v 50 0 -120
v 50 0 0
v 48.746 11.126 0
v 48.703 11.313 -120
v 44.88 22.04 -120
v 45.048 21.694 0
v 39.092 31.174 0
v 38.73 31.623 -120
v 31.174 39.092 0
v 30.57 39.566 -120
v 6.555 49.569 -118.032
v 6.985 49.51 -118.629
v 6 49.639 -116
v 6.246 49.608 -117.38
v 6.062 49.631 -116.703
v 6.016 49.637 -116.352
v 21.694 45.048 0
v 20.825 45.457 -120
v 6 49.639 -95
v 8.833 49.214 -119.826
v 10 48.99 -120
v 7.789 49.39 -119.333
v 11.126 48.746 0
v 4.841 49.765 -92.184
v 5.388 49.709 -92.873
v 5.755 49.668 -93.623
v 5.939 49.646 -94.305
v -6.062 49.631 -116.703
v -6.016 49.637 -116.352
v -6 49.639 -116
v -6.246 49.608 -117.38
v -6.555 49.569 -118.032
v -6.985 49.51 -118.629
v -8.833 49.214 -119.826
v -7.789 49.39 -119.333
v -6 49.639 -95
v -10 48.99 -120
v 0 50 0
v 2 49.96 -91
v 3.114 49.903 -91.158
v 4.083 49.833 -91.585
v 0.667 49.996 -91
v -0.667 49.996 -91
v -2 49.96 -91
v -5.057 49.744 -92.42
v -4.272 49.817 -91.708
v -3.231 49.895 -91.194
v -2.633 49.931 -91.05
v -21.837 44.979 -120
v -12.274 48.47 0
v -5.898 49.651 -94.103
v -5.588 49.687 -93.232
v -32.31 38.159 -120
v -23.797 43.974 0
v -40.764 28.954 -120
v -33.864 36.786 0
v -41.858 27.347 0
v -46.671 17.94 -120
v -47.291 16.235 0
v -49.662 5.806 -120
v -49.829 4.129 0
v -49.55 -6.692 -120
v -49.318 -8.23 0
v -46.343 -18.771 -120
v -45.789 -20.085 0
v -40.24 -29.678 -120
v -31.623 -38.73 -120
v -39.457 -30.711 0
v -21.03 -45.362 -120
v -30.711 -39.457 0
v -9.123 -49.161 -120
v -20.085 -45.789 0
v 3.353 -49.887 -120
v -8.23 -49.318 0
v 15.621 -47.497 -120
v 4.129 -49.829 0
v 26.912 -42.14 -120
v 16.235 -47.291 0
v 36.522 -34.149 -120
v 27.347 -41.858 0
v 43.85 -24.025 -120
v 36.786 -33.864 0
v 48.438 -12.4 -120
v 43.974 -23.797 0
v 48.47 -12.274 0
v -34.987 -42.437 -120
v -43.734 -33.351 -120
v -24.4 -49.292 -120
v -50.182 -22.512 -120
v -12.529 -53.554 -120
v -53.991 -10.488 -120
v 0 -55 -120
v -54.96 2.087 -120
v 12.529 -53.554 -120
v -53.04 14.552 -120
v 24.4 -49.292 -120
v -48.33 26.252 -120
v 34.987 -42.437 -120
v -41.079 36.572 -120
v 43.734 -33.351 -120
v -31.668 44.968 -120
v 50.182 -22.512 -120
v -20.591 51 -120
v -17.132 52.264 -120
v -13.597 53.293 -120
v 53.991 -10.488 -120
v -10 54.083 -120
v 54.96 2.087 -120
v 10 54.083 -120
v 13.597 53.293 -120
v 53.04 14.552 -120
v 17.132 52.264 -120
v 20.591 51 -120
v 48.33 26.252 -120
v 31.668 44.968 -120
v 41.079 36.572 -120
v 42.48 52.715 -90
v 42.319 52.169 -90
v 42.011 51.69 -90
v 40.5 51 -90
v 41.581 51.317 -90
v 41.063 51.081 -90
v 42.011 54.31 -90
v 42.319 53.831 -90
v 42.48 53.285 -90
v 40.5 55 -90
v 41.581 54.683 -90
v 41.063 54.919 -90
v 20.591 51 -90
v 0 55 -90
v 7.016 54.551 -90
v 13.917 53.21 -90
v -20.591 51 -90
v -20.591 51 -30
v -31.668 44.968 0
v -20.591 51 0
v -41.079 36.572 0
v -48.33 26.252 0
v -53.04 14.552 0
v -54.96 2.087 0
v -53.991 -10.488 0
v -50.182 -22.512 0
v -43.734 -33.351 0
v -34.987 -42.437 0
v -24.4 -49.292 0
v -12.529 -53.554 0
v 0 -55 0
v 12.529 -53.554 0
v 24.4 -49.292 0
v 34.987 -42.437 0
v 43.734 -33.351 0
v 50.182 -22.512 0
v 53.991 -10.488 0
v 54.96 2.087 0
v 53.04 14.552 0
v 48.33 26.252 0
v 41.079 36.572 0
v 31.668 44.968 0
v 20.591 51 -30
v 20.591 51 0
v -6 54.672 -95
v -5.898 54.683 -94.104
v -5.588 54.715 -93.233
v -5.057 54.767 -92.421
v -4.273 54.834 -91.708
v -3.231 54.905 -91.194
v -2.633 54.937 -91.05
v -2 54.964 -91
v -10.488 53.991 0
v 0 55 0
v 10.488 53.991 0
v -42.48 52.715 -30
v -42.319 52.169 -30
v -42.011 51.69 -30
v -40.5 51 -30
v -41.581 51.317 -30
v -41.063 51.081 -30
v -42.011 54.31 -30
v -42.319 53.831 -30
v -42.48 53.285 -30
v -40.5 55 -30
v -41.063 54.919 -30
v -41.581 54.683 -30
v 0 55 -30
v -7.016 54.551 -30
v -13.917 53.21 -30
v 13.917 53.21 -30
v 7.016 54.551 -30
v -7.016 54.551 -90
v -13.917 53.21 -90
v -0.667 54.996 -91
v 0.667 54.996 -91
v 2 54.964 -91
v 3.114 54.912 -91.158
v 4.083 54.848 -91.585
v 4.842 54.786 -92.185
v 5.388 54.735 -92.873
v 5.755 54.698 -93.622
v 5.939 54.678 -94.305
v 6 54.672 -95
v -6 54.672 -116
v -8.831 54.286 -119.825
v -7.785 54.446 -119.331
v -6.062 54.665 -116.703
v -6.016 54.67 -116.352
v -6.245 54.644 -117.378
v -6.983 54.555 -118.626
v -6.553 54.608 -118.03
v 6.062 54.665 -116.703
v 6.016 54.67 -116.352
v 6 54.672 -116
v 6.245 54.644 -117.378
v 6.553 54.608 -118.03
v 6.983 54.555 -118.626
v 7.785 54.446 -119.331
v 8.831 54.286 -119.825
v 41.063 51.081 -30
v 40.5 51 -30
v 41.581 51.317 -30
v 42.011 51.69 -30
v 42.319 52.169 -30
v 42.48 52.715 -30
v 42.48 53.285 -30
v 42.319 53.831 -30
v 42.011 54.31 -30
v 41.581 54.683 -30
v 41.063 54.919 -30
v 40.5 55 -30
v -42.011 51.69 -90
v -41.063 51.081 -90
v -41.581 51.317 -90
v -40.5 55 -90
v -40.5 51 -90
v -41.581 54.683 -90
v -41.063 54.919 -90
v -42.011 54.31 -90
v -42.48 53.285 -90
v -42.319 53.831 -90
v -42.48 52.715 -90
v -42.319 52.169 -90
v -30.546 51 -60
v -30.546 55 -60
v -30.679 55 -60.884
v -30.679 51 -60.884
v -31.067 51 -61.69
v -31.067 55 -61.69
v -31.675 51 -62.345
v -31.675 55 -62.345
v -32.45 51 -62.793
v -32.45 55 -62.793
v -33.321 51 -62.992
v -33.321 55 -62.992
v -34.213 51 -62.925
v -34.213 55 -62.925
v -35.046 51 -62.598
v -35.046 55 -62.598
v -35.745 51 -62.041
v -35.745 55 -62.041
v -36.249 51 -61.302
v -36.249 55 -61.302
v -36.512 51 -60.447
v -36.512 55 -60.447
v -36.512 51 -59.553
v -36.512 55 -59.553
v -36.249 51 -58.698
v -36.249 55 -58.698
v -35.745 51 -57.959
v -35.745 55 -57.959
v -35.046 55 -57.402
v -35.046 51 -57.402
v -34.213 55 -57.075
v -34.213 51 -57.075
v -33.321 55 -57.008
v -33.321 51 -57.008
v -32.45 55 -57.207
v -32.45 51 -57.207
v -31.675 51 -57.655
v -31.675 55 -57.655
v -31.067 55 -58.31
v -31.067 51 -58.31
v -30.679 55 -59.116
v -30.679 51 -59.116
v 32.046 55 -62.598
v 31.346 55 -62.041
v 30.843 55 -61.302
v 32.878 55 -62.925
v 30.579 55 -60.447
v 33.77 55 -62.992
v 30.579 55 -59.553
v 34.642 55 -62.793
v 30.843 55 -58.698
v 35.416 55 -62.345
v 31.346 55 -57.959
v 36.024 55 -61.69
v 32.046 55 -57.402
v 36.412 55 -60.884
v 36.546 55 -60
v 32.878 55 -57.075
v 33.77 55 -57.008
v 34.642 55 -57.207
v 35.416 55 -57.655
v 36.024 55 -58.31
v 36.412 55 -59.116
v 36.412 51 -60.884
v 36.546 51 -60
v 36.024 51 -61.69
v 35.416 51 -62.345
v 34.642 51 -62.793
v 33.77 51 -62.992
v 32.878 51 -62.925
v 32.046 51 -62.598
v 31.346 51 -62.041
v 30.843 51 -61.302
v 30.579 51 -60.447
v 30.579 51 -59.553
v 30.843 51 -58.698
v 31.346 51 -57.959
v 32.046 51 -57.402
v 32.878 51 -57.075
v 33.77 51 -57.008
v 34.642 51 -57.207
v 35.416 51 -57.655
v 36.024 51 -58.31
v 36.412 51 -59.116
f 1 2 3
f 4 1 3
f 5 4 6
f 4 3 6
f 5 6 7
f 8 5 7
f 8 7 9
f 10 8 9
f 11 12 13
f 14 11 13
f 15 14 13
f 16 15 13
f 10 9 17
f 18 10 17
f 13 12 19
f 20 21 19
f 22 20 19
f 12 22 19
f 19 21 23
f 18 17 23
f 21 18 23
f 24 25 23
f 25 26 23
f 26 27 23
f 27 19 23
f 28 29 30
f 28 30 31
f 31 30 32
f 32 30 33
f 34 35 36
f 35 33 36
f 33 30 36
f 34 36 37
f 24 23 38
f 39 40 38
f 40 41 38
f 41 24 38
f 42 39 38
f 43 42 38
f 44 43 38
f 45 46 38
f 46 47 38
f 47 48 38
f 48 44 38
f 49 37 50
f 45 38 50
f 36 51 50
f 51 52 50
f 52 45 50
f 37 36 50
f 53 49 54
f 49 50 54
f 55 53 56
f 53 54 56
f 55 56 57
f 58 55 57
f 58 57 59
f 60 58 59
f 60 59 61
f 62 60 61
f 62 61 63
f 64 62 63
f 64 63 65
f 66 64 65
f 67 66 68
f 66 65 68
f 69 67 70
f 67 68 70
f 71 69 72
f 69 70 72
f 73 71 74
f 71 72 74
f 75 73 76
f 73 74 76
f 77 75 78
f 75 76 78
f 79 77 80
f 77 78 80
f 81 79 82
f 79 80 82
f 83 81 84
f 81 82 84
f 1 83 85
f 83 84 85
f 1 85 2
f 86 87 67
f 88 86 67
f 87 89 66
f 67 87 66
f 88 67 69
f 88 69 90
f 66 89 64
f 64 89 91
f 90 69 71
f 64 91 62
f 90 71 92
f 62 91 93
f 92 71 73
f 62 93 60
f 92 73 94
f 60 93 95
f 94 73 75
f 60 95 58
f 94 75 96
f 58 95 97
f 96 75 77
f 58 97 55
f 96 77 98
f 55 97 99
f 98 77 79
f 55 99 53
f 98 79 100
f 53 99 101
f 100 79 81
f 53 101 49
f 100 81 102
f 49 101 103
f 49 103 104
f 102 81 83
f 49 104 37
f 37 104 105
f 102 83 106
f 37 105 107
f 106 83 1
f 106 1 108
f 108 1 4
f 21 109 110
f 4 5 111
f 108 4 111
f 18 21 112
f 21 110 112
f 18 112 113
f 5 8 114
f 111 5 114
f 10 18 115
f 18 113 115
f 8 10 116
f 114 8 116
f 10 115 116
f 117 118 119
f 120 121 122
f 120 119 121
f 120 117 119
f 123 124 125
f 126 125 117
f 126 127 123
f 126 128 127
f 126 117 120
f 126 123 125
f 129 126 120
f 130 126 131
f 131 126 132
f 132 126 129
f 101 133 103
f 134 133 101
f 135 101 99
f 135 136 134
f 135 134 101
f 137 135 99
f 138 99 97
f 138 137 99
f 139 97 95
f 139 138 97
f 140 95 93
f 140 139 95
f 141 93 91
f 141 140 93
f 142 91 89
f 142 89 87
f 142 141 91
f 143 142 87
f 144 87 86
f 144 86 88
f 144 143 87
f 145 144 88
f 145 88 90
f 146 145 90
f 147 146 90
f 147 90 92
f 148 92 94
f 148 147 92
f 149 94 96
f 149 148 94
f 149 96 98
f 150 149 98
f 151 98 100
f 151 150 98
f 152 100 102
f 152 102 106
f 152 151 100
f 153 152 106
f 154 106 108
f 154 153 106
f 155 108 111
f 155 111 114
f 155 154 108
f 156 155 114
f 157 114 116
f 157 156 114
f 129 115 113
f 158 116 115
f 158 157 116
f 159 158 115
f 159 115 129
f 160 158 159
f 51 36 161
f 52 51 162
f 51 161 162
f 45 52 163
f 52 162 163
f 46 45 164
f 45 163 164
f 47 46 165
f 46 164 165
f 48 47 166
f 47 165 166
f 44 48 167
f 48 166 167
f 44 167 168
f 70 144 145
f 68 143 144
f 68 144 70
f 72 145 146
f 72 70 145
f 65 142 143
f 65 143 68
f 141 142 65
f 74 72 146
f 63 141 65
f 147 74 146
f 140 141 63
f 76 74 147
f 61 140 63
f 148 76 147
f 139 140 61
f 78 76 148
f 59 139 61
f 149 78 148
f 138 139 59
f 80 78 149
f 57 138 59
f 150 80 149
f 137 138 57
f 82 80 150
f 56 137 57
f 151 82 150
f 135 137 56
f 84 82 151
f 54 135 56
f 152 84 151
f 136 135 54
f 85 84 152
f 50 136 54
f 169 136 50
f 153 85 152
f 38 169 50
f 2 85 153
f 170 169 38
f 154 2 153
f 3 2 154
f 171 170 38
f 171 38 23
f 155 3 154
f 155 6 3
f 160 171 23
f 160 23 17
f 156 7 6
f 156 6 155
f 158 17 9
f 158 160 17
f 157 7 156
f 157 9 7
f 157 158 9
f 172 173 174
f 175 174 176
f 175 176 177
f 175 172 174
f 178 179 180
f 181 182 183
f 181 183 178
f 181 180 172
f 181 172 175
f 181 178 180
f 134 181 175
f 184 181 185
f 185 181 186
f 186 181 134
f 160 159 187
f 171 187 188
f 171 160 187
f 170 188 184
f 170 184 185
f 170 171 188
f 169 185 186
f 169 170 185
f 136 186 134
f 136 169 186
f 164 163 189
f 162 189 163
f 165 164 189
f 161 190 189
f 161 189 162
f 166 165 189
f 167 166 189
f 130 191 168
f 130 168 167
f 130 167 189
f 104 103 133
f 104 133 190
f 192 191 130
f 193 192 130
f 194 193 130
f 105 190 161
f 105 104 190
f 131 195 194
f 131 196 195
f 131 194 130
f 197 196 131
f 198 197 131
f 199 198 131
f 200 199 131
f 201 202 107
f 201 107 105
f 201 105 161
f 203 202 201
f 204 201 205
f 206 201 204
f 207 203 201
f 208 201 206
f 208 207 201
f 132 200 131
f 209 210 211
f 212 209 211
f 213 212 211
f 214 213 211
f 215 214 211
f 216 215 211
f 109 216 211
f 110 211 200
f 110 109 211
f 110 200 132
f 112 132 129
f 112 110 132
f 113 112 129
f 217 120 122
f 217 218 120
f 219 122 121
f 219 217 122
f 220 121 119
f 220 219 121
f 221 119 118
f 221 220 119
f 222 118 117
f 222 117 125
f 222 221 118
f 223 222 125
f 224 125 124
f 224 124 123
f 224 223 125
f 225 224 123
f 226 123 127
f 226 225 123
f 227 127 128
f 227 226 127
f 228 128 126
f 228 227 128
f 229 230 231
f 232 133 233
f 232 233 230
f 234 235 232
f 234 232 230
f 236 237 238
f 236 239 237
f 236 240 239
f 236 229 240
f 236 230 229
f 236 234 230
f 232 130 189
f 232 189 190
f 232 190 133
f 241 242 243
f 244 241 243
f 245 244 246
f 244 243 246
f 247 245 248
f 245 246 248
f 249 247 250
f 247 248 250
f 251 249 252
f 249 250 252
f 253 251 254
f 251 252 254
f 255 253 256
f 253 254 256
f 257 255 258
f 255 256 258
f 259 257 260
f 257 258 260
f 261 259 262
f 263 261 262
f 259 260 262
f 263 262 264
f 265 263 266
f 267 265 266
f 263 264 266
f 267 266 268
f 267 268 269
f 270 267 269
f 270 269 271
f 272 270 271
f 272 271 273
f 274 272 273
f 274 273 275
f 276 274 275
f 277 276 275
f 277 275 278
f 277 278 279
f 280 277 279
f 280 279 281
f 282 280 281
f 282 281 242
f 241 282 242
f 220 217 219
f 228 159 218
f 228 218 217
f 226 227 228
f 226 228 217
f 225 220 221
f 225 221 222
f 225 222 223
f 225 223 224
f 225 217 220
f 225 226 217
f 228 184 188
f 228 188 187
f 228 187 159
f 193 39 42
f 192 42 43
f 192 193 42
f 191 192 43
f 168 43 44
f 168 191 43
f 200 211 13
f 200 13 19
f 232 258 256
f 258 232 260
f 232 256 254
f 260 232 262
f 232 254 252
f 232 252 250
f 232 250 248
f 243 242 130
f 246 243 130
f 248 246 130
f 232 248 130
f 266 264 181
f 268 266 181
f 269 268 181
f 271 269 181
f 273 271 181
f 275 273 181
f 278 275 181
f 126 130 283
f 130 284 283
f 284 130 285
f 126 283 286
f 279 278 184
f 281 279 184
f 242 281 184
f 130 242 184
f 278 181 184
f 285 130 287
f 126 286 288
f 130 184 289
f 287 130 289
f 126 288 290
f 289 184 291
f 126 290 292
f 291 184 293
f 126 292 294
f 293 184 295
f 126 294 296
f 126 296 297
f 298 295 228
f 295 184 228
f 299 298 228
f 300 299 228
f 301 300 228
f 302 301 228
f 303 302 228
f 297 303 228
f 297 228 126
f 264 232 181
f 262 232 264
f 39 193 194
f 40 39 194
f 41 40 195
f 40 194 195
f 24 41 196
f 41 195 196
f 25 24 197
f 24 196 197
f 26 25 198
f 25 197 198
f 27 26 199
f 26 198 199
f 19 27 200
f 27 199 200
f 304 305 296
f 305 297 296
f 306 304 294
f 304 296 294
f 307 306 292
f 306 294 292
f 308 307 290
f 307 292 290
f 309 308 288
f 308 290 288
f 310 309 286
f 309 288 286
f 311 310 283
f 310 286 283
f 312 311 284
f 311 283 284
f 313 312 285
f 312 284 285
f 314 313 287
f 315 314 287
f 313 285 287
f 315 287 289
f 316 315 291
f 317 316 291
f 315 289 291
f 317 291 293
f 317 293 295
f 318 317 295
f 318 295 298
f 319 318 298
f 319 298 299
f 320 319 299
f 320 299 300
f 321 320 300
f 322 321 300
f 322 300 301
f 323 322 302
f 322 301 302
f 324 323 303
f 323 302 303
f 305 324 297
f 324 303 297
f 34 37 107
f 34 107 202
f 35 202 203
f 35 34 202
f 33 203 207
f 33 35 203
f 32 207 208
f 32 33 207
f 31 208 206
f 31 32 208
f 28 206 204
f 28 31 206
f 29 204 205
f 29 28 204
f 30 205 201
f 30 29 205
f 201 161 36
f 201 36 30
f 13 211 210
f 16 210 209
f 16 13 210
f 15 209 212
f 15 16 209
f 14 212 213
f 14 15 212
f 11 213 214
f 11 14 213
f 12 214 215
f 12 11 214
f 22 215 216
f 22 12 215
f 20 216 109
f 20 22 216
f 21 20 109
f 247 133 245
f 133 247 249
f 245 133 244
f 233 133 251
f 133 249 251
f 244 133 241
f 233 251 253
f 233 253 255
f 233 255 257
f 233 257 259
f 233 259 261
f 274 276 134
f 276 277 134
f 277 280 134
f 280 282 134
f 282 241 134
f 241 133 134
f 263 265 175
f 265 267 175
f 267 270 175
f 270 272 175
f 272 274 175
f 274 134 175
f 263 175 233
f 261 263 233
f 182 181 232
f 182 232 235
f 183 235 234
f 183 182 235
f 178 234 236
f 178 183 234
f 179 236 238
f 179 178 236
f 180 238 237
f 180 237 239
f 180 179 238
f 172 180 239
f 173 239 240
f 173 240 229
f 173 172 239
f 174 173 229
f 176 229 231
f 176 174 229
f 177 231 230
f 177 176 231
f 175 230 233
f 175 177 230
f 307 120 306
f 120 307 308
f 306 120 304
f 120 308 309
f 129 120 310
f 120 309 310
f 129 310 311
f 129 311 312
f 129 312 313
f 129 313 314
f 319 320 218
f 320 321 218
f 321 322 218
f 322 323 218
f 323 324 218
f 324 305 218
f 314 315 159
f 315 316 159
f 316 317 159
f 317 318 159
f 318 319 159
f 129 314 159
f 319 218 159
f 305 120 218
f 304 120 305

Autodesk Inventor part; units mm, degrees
ref_plane "YZ Plane" through (0, 0, 0) normal (1, 0, 0) x (0, 1, 0)
ref_plane "XZ Plane" through (0, 0, 0) normal (0, 1, 0) x (-1, 0, 0)
sketch "Sketch1" plane through (0, 0, 0) normal (0, 0, 1) x (1, 0, 0)
  arc A0 (-20.5913, 51) -> (20.5913, 51) centre (0, 0) ccw
  circle A1 centre (0, 0) radius 50
  line L0 (-40.5, 55) -> (40.5, 55)
  arc A2 (-40.5, 55) -> (-40.5, 51) centre (-40.5, 53) ccw
  arc A3 (40.5, 51) -> (40.5, 55) centre (40.5, 53) ccw
  line L1 (40.5, 51) -> (19.5959, 51)
  line L2 (40.5, 51) -> (19.5959, 51)
  line L3 (40.5, 51) -> (19.5959, 51)
  line L4 (19.5959, 51) -> (-40.5, 51)
  line L5 (0, 51) -> (0, 50)
  dimension "d0" = 110
  dimension "d1" = 100
extrude "Extrusion1" add sketch "Sketch1" against normal blind 120
sketch "Sketch2" plane through (0, 0, 0) normal (0, 0, 1) x (1, 0, 0)
  circle A0 centre (0, 0) radius 50 projected
  line L0 (-40.5, 51) -> (-20.5913, 51) projected
  arc A1 (-20.5913, 51) -> (20.5913, 51) centre (0, 0) ccw projected
  line L1 (20.5913, 51) -> (40.5, 51) projected
  arc A2 (40.5, 51) -> (40.5, 55) centre (40.5, 53) ccw projected
  line L2 (40.5, 55) -> (-40.5, 55) projected
  arc A3 (-40.5, 55) -> (-40.5, 51) centre (-40.5, 53) ccw projected
  circle A4 centre (0, 0) radius 55
  point P0 (160.5446, 51)
extrude "Extrusion2" cut sketch "Sketch2" against normal blind 30 contours A3 L2 A4 L0 | L2 A2 L1 A4
ref_plane "Work Plane1" through (0, 0, -60) normal (0, 0, 1) x (1, 0, 0)
sketch "Sketch3" plane through (50, 55, 0) normal (0, 1, 0) x (1, 0, 0)
  line L0 (-44, 120) -> (-56, 120)
  line L1 (-30.4041, 0) -> (-69.5959, 0) projected
  line L2 (-56, 120) -> (-44, 120)
  line L3 (-44, 120) -> (-44, 95)
  line L4 (-48, 91) -> (-52, 91)
  line L5 (-56, 95) -> (-56, 120)
  arc A0 (-56, 95) -> (-52, 91) centre (-52, 95) ccw
  arc A1 (-48, 91) -> (-44, 95) centre (-48, 95) ccw
  point P0 (17.7764, 120)
  point P1 (-44, 91)
  point P2 (-56, 91)
  dimension "d33" = 12
  dimension "d43" = 12
  dimension "d44" = 29
  dimension "d45" = 4
extrude "Extrusion3" cut sketch "Sketch3" against normal blind 7
mirror "Mirror2" about plane through (0, 0, -60) normal (0, 0, 1) of "Extrusion2"
fillet "Fillet1" radius 4 2 edges at (-6, 52.1552, -120) (6, 52.1552, -120)
sketch "Sketch4" plane through (-40.5, 55, -30) normal (0, 1, 0) x (1, 0, 0)
  line L0 (40.5, 60) -> (0, 60) projected
  line L1 (0, 0) -> (0, 60) projected
  line L2 (0, 0) -> (40.5, 0) projected
  line L3 (40.5, 0) -> (81, 0) projected
  line L4 (81, 0) -> (81, 60) projected
  line L5 (81, 60) -> (40.5, 60) projected
  line L6 (81, 0) -> (81, 60) projected
  line L7 (19.9087, 60) -> (19.9087, 0) projected
  line L8 (61.0913, 0) -> (61.0913, 60) projected
  line L9 (81, 0) -> (61.0913, 0) projected
  circle A0 centre (6.9544, 30) radius 3
  circle A1 centre (74.0456, 30) radius 3
  point P0 (40.5, -30)
  dimension "d48" = 6
  dimension "d51" = 6
extrude "Extrusion4" cut sketch "Sketch4" against normal blind 5 contours A0 | A1
properties part number "Propeller Shroud" material "ABS Plastic"
